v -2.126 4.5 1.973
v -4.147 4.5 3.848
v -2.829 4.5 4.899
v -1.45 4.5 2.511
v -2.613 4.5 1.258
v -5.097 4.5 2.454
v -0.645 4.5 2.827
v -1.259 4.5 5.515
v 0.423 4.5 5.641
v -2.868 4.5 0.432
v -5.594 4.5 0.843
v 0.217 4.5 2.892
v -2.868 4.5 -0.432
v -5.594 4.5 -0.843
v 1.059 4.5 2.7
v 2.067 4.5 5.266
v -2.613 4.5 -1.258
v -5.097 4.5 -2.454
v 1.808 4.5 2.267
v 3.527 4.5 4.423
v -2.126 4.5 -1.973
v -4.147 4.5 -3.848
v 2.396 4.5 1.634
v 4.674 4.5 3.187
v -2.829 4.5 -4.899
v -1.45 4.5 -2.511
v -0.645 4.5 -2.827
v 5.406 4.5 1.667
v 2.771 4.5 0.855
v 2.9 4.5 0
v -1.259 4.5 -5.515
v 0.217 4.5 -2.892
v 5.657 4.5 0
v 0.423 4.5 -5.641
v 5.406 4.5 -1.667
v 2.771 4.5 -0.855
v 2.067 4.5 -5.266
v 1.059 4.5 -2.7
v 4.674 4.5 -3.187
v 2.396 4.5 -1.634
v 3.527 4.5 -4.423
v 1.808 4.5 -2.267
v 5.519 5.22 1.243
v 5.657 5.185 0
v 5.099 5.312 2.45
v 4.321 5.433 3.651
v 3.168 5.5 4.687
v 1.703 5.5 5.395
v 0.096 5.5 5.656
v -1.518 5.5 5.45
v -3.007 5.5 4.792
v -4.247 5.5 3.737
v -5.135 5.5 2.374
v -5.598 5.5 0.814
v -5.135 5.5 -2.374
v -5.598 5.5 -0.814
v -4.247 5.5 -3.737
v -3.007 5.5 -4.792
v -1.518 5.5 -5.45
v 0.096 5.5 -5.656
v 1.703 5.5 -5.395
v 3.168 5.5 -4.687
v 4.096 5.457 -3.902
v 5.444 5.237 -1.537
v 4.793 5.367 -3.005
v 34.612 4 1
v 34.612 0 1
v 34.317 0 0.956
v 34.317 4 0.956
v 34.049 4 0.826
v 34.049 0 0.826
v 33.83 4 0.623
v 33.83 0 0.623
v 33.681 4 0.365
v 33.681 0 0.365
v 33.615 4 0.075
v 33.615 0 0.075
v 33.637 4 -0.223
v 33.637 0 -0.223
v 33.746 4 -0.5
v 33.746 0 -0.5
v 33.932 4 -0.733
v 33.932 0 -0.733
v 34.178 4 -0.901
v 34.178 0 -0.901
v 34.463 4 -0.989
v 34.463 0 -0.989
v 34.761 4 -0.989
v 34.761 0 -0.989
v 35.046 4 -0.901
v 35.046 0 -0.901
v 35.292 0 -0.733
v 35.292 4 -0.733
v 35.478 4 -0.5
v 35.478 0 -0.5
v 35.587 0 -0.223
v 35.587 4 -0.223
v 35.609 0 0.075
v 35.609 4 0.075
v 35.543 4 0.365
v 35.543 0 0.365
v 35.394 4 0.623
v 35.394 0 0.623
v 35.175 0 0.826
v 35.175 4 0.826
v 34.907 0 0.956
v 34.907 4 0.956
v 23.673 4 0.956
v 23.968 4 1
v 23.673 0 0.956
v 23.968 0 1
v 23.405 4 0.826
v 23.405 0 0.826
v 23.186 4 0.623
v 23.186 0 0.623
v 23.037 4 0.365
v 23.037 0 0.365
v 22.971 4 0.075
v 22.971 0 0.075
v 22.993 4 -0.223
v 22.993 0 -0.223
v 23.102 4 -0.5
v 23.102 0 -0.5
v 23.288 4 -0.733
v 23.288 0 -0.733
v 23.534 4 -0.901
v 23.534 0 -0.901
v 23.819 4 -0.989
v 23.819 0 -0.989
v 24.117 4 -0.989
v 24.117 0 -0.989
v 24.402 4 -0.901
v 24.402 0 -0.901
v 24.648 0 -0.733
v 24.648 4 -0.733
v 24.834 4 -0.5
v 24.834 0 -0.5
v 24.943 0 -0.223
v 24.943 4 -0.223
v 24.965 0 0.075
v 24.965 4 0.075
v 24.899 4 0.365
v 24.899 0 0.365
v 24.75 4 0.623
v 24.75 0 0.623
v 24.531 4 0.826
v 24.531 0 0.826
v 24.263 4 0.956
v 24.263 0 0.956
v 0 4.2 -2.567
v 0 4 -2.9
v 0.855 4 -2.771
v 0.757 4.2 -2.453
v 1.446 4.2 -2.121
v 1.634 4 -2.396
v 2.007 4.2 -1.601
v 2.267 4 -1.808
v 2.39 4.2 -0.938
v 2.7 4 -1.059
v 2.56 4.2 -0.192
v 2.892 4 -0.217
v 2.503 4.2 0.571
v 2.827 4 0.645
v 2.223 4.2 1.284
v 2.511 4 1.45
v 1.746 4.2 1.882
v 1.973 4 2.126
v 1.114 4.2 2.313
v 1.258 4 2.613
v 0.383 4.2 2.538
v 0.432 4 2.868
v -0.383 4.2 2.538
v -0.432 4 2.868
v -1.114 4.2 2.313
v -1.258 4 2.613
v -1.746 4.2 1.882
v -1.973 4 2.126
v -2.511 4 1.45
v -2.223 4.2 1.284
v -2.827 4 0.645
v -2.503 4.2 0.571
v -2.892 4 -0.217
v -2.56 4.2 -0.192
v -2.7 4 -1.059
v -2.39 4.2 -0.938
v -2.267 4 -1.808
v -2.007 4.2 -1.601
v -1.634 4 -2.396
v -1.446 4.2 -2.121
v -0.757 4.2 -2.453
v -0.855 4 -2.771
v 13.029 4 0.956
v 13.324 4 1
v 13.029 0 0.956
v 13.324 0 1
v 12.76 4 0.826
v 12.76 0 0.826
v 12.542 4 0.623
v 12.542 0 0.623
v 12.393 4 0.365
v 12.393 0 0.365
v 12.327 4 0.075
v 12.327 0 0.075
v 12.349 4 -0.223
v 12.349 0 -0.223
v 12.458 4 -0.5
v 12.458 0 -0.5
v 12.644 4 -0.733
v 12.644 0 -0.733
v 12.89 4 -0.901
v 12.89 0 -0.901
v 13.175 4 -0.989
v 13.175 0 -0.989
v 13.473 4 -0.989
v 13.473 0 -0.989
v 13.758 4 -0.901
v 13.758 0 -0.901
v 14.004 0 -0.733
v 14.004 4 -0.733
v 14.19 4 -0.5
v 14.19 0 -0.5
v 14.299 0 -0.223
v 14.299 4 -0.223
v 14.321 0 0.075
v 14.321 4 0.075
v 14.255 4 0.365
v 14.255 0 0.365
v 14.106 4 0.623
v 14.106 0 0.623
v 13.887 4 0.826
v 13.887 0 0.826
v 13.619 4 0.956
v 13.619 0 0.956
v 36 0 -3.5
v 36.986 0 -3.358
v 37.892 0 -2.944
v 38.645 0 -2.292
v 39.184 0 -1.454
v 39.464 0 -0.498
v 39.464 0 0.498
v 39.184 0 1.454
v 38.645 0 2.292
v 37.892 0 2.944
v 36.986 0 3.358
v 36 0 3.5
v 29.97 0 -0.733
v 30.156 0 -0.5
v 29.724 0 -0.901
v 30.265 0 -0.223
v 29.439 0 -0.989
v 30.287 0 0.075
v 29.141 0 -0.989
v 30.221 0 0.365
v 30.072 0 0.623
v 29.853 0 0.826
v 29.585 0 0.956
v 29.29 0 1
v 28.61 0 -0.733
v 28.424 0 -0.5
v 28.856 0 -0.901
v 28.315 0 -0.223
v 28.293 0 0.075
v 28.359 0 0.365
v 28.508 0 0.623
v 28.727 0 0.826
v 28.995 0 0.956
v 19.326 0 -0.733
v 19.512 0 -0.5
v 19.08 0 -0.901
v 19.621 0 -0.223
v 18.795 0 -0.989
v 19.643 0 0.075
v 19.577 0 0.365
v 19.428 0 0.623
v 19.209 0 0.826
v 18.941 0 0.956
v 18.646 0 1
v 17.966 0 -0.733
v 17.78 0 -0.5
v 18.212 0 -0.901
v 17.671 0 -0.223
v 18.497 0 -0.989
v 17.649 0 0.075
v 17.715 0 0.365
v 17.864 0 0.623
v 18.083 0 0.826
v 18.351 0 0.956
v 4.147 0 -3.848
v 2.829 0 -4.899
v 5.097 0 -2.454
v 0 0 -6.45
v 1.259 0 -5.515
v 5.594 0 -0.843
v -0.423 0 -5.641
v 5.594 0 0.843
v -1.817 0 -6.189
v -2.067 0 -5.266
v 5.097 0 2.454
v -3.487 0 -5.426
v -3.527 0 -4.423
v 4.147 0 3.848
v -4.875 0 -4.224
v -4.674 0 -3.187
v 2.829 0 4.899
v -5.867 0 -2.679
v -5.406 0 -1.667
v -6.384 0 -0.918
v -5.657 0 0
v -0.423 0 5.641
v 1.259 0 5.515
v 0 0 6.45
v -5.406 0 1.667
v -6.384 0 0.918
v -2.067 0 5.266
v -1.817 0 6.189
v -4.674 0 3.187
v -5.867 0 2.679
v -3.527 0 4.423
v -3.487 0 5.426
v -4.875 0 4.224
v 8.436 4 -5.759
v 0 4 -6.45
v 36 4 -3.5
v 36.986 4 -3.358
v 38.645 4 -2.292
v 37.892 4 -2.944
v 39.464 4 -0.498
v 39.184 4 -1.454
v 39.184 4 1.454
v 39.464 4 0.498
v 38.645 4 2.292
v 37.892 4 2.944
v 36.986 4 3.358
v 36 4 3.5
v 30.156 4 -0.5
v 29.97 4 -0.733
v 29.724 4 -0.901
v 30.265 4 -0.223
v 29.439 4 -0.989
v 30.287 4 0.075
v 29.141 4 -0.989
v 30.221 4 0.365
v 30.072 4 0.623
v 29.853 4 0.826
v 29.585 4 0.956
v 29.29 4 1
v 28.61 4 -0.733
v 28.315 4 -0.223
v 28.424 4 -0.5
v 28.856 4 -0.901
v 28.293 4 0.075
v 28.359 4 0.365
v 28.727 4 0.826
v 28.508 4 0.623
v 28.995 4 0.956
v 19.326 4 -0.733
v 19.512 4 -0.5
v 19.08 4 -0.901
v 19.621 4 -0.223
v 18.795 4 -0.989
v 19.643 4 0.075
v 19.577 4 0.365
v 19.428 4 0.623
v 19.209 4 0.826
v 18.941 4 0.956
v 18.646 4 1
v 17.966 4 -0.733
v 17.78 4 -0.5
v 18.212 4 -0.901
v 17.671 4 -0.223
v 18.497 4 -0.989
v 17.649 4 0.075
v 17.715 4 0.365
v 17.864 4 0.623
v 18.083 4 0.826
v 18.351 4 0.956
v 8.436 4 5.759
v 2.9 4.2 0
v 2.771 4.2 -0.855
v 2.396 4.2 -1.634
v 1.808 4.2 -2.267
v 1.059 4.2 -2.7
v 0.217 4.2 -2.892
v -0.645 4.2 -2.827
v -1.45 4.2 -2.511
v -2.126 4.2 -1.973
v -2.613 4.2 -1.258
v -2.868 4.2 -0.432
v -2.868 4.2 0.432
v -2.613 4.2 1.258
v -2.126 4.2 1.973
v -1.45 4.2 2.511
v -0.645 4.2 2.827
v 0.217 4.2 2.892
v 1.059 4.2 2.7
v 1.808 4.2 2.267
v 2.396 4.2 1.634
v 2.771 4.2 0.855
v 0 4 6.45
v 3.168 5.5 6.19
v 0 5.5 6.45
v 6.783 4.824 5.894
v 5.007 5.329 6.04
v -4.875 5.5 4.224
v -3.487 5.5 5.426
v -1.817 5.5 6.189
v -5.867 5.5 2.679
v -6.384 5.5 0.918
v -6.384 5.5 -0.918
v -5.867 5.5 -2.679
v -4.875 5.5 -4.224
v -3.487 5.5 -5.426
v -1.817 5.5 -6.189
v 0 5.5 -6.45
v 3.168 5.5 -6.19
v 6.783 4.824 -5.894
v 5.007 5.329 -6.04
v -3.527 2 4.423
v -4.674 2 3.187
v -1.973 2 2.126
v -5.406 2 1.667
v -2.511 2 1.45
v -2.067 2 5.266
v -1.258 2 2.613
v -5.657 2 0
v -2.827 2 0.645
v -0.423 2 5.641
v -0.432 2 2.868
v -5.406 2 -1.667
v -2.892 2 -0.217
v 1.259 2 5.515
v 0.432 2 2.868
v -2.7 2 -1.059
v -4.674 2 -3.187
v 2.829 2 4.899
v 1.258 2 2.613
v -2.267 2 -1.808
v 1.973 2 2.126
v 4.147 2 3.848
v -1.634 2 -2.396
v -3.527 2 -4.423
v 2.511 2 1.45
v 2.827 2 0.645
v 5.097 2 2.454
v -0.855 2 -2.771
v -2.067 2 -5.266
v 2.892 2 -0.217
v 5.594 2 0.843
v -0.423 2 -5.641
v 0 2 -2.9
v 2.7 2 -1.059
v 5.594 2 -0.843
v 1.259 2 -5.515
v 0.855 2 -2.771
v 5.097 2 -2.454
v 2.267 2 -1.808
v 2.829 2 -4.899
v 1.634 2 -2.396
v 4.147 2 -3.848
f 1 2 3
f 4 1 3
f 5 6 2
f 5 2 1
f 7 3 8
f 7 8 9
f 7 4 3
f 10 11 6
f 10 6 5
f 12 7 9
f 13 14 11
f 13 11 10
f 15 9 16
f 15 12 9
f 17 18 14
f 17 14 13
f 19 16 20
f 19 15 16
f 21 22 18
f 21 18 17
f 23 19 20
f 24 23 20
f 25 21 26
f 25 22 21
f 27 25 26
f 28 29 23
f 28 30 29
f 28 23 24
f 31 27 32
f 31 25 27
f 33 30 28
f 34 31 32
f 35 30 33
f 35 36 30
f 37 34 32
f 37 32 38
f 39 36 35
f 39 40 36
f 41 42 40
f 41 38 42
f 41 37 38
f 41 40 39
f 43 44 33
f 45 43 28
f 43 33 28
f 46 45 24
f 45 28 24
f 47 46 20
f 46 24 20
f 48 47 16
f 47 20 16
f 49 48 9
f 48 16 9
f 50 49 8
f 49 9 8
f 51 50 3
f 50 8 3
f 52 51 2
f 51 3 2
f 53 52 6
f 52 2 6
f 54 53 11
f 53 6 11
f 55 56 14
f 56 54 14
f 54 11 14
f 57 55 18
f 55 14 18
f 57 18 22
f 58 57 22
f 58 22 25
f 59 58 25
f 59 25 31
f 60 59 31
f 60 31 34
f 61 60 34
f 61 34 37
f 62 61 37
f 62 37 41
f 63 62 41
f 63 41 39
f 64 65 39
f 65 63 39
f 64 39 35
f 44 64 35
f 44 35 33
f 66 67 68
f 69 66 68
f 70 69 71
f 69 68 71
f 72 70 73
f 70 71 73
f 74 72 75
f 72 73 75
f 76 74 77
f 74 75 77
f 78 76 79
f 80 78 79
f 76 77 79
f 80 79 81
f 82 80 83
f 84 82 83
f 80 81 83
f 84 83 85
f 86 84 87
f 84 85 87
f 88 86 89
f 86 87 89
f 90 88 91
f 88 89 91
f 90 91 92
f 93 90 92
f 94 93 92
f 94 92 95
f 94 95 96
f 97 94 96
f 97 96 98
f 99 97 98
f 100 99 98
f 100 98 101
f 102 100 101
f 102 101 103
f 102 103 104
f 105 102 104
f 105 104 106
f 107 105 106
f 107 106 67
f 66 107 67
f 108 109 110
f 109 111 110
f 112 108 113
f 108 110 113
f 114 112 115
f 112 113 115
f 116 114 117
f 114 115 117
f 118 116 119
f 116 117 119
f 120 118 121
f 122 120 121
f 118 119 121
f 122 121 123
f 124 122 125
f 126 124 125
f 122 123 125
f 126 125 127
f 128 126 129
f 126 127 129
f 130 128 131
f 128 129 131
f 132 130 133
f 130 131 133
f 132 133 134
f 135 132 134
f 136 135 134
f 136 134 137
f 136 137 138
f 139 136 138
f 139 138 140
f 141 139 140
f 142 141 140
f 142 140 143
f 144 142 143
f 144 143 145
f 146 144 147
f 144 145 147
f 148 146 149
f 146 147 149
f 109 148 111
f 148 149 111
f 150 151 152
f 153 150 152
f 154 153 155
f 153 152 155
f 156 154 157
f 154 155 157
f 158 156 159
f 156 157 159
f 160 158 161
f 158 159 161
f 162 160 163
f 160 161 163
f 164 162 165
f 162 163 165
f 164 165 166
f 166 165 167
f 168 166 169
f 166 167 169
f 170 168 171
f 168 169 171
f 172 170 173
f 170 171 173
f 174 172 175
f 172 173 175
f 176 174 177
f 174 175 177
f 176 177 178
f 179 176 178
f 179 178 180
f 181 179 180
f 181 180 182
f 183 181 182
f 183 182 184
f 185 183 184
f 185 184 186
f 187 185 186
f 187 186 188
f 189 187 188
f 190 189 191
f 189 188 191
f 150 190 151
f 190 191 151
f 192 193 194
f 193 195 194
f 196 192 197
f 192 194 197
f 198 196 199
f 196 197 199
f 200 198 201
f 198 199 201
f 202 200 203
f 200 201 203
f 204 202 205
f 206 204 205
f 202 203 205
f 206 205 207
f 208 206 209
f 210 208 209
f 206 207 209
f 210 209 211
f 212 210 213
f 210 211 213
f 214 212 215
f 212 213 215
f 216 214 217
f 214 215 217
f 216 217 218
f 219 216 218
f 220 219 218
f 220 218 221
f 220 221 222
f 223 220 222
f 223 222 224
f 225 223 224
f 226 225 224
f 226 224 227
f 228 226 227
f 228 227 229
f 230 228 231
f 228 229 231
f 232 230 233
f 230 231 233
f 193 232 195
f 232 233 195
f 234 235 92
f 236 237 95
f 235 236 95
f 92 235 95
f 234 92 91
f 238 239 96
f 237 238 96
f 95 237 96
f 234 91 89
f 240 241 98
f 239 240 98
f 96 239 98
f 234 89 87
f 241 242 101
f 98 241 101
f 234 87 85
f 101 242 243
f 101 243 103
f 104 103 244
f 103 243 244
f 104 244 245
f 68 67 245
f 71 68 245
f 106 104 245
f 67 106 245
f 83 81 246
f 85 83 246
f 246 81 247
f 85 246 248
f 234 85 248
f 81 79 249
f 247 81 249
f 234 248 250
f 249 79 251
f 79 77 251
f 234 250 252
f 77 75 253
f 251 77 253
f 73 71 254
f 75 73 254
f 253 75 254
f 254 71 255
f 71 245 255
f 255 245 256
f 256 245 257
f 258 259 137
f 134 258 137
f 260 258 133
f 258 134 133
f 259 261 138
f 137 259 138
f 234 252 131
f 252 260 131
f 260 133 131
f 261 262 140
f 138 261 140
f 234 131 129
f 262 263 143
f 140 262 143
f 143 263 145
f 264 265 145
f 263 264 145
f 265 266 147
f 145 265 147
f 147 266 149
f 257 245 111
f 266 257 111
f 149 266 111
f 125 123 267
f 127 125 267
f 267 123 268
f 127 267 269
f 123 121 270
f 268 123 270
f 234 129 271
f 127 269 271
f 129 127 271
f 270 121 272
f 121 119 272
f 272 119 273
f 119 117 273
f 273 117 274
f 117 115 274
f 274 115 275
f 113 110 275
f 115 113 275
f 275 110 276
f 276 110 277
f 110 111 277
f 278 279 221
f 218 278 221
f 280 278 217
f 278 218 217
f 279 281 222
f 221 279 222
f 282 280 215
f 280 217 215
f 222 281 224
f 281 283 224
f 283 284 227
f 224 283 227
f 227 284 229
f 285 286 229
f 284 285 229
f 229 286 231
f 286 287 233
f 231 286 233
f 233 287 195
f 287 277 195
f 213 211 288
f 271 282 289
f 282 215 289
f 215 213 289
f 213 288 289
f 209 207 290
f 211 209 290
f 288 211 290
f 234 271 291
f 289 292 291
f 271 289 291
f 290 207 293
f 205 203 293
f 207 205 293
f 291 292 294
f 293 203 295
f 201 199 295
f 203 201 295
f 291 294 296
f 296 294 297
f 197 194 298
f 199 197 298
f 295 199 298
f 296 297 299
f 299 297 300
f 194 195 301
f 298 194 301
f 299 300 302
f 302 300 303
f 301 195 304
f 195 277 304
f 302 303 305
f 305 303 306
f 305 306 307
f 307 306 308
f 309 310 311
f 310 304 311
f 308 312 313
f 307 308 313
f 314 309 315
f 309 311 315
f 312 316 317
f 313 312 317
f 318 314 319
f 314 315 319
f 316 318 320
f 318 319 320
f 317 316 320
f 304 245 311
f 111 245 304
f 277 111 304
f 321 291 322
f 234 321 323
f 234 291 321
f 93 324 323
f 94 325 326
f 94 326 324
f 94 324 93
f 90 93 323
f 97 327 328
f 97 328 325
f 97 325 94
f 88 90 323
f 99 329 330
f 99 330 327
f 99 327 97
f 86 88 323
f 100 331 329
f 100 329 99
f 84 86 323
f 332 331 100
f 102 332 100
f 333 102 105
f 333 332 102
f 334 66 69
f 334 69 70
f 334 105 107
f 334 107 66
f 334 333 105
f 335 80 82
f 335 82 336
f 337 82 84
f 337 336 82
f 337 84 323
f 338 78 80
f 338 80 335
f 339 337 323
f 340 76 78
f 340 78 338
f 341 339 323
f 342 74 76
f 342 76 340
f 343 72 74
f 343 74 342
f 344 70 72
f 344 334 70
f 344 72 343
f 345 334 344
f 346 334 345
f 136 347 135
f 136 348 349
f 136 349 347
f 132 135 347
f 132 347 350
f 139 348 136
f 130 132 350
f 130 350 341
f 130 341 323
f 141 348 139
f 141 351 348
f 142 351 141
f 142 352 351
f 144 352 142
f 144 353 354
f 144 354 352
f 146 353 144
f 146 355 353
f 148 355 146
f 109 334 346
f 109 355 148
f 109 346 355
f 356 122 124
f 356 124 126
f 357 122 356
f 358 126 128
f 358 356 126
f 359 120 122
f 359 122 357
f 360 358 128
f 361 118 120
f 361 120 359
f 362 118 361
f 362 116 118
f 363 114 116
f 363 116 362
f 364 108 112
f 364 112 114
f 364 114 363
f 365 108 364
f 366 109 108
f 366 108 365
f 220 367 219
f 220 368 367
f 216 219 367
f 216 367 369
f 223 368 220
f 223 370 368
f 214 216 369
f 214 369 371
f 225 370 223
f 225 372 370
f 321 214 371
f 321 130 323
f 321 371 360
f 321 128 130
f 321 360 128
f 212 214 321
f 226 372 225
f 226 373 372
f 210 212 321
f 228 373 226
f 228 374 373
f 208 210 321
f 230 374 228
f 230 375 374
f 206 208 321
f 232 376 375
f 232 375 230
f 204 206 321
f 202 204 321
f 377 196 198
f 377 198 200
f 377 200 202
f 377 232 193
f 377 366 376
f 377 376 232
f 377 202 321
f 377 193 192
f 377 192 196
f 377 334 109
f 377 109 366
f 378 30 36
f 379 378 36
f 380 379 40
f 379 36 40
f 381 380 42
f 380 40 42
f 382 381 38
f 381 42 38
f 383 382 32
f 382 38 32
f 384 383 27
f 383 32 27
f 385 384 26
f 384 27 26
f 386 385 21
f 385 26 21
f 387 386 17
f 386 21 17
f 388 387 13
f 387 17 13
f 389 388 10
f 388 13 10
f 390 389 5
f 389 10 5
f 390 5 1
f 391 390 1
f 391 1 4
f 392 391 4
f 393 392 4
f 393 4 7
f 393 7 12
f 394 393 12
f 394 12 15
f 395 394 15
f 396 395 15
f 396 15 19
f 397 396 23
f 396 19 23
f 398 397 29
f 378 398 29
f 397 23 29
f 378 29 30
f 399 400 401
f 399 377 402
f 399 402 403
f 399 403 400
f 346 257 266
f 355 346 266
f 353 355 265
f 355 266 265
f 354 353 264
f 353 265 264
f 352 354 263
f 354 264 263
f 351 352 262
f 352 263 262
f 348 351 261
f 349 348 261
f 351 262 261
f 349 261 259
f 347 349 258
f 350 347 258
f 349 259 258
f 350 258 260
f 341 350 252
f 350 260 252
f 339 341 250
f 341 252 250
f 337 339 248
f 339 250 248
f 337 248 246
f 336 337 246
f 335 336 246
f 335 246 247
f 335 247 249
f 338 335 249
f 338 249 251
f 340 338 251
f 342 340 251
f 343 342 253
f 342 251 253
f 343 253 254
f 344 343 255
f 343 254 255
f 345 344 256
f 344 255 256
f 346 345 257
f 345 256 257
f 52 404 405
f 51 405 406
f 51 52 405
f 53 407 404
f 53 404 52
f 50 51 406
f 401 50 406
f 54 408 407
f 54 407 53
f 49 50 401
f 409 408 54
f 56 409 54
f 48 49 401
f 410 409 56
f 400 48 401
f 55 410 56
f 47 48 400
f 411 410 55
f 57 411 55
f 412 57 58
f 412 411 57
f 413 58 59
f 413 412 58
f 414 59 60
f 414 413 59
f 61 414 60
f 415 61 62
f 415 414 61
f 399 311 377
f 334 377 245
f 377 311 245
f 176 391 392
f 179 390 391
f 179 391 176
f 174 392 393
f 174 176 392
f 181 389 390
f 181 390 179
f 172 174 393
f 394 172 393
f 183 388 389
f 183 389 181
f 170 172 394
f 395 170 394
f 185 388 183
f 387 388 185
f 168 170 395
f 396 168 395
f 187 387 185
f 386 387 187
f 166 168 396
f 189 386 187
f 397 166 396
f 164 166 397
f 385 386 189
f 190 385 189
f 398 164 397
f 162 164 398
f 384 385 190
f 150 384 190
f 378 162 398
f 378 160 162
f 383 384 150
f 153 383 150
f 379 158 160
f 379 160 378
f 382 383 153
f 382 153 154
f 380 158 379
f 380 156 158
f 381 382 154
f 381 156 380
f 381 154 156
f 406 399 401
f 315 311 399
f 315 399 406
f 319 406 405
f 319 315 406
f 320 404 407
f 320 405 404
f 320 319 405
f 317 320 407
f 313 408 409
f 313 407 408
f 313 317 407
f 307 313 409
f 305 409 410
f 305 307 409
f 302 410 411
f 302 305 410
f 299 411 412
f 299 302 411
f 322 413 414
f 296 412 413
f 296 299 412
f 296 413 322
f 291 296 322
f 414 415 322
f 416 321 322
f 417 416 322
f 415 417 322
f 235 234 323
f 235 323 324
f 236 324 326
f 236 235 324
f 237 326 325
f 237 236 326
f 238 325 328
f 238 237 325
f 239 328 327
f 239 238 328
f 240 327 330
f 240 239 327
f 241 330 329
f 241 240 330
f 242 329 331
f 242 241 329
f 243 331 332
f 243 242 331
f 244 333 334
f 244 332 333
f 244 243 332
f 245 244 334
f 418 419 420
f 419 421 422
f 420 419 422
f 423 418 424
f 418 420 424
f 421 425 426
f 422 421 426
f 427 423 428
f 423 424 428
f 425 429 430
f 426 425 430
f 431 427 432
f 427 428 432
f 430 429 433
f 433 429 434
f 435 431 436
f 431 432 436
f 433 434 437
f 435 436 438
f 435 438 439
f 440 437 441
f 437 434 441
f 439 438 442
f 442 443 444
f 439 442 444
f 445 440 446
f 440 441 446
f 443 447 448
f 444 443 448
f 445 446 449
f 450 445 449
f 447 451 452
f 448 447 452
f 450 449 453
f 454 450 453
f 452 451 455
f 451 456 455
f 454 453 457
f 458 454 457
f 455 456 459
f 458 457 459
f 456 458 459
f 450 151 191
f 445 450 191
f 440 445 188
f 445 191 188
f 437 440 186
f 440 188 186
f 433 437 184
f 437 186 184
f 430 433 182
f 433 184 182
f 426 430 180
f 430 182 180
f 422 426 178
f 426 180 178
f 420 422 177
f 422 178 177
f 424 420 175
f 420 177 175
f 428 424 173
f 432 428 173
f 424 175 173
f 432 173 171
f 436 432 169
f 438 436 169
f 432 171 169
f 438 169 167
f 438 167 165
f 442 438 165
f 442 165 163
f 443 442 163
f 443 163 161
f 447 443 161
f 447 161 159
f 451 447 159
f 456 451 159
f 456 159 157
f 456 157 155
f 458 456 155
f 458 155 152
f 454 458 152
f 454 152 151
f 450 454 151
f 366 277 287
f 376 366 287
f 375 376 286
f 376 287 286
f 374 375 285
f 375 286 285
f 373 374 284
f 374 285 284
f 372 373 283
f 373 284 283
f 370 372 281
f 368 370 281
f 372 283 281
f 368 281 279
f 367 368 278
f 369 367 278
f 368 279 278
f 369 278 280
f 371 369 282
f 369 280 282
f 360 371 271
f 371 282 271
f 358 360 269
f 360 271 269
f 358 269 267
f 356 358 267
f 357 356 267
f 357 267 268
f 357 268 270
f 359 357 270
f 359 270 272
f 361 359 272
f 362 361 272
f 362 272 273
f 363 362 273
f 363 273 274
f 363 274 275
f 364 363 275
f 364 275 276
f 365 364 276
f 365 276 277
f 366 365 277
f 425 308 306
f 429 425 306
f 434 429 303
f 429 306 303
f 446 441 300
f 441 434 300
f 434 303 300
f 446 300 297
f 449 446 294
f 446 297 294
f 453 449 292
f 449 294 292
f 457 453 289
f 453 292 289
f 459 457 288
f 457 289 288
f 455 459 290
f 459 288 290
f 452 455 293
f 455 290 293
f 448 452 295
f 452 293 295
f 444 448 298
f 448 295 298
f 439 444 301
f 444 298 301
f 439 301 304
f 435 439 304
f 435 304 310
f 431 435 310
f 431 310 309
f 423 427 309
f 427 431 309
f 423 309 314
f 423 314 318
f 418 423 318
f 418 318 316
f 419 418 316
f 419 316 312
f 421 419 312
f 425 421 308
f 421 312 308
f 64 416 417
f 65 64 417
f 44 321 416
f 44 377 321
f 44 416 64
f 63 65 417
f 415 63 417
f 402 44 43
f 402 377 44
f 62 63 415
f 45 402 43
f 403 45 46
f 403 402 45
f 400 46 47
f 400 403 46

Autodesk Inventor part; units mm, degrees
ref_plane "YZ Plane" through (0, 0, 0) normal (1, 0, 0) x (0, 1, 0)
ref_plane "XZ Plane" through (0, 0, 0) normal (0, 1, 0) x (-1, 0, 0)
ref_plane "XY Plane" through (0, 0, 0) normal (0, 0, 1) x (1, 0, 0)
sketch "Sketch1" plane through (0, 0, 0) normal (0, 1, 0) x (-1, 0, 0)
  circle A0 centre (0, 0) radius 6.45
  circle A1 centre (0, 0) radius 5.657
  circle A2 centre (0, 0) radius 2.85
  circle A3 centre (0, 0) radius 1.25
  line L0 (0, 0) -> (-36, 0)
  circle A4 centre (-36, 0) radius 3.5
  line L1 (0, 6.45) -> (-36, 3.5)
  line L2 (0, -6.45) -> (-36, -3.5)
  dimension "d0" = 12.9
  dimension "d1" = 11.314
  dimension "d2" = 5.7
  dimension "d3" = 2.5
  dimension "d4" = 36
  dimension "d5" = 7
extrude "Extrusion1" add sketch "Sketch1" along normal blind 4 contours A0 L2 L1 | A0 L0 A4 L1 | L2 A4 L0 A0 | A4
sketch "Sketch2" plane through (0, 4, 0) normal (0, 1, 0) x (1, 0, 0)
  line L0 (8.4358, -5.7587) -> (8.4358, 5.7587)
  line L1 (8.4358, -5.7587) -> (0, -6.45)
  line L2 (0, -6.45) -> (36, -3.5) projected
  line L3 (8.4358, 5.7587) -> (0, 6.45)
  line L4 (36, 3.5) -> (0, 6.45) projected
  arc A0 (0, 6.45) -> (0, -6.45) centre (0, 0) ccw
  arc A1 (0, 6.45) -> (0, -6.45) centre (0, 0) ccw projected
  circle A2 centre (0, 0) radius 5.657
extrude "Extrusion2" add sketch "Sketch2" along normal blind 1.5
fillet "Fillet1" radius 10 1 edges at (8.4358, 5.5, 0)
sketch "Sketch4" plane through (0, 4, 0) normal (0, 1, 0) x (1, 0, 0)
  circle A0 centre (0, 0) radius 2.9
  dimension "d11" = 5.8
sketch "Sketch5" plane through (0, 4, 0) normal (0, 1, 0) x (1, 0, 0)
  circle A0 centre (0, 0) radius 5.657
extrude "Extrusion3" add sketch "Sketch5" along normal blind 0.5 and the other way blind 2
sketch "Sketch6" plane through (0, 4.5, 0) normal (0, 1, 0) x (1, 0, 0)
  circle A0 centre (0, 0) radius 2.9
  dimension "d17" = 5.8
hole "Hole1" at (0, 4, 0) direction (0, -1, 0) diameter 3 end through all
sketch "Sketch7" plane through (0, 2, 0) normal (0, -1, 0) x (1, 0, 0)
  circle A0 centre (0, 0) radius 2.9
  dimension "d27" = 5.8
hole "Hole2" at (0, 2, 0) direction (0, 1, 0) diameter 5.8 depth 2 tip angle 118
sketch "Sketch9" plane through (0, 4, 0) normal (0, 1, 0) x (1, 0, 0)
  line L0 (8.4358, 5.7587) -> (8.4358, -5.7587) projected
  arc A0 (36, -3.5) -> (36, 3.5) centre (36, 0) ccw projected
  circle A1 centre (23.9679, 0) radius 1
  circle A2 centre (34.612, 0) radius 1
  line L1 (0, -6.45) -> (36, -3.5) projected
  circle A3 centre (29.29, 0) radius 1
  circle A4 centre (13.3238, 0) radius 1
  circle A5 centre (18.6459, 0) radius 1
  point P0 (0, 0)
hole "Hole4" at (13.3238, 4, 0) at (18.6459, 4, 0) at (23.9679, 4, 0) at (29.29, 4, 0) at (34.612, 4, 0) direction (0, -1, 0) diameter 2 end through all
extrude "Extrusion5" cut sketch "Sketch6" against normal blind 0.3
properties part number "servo_arm"
